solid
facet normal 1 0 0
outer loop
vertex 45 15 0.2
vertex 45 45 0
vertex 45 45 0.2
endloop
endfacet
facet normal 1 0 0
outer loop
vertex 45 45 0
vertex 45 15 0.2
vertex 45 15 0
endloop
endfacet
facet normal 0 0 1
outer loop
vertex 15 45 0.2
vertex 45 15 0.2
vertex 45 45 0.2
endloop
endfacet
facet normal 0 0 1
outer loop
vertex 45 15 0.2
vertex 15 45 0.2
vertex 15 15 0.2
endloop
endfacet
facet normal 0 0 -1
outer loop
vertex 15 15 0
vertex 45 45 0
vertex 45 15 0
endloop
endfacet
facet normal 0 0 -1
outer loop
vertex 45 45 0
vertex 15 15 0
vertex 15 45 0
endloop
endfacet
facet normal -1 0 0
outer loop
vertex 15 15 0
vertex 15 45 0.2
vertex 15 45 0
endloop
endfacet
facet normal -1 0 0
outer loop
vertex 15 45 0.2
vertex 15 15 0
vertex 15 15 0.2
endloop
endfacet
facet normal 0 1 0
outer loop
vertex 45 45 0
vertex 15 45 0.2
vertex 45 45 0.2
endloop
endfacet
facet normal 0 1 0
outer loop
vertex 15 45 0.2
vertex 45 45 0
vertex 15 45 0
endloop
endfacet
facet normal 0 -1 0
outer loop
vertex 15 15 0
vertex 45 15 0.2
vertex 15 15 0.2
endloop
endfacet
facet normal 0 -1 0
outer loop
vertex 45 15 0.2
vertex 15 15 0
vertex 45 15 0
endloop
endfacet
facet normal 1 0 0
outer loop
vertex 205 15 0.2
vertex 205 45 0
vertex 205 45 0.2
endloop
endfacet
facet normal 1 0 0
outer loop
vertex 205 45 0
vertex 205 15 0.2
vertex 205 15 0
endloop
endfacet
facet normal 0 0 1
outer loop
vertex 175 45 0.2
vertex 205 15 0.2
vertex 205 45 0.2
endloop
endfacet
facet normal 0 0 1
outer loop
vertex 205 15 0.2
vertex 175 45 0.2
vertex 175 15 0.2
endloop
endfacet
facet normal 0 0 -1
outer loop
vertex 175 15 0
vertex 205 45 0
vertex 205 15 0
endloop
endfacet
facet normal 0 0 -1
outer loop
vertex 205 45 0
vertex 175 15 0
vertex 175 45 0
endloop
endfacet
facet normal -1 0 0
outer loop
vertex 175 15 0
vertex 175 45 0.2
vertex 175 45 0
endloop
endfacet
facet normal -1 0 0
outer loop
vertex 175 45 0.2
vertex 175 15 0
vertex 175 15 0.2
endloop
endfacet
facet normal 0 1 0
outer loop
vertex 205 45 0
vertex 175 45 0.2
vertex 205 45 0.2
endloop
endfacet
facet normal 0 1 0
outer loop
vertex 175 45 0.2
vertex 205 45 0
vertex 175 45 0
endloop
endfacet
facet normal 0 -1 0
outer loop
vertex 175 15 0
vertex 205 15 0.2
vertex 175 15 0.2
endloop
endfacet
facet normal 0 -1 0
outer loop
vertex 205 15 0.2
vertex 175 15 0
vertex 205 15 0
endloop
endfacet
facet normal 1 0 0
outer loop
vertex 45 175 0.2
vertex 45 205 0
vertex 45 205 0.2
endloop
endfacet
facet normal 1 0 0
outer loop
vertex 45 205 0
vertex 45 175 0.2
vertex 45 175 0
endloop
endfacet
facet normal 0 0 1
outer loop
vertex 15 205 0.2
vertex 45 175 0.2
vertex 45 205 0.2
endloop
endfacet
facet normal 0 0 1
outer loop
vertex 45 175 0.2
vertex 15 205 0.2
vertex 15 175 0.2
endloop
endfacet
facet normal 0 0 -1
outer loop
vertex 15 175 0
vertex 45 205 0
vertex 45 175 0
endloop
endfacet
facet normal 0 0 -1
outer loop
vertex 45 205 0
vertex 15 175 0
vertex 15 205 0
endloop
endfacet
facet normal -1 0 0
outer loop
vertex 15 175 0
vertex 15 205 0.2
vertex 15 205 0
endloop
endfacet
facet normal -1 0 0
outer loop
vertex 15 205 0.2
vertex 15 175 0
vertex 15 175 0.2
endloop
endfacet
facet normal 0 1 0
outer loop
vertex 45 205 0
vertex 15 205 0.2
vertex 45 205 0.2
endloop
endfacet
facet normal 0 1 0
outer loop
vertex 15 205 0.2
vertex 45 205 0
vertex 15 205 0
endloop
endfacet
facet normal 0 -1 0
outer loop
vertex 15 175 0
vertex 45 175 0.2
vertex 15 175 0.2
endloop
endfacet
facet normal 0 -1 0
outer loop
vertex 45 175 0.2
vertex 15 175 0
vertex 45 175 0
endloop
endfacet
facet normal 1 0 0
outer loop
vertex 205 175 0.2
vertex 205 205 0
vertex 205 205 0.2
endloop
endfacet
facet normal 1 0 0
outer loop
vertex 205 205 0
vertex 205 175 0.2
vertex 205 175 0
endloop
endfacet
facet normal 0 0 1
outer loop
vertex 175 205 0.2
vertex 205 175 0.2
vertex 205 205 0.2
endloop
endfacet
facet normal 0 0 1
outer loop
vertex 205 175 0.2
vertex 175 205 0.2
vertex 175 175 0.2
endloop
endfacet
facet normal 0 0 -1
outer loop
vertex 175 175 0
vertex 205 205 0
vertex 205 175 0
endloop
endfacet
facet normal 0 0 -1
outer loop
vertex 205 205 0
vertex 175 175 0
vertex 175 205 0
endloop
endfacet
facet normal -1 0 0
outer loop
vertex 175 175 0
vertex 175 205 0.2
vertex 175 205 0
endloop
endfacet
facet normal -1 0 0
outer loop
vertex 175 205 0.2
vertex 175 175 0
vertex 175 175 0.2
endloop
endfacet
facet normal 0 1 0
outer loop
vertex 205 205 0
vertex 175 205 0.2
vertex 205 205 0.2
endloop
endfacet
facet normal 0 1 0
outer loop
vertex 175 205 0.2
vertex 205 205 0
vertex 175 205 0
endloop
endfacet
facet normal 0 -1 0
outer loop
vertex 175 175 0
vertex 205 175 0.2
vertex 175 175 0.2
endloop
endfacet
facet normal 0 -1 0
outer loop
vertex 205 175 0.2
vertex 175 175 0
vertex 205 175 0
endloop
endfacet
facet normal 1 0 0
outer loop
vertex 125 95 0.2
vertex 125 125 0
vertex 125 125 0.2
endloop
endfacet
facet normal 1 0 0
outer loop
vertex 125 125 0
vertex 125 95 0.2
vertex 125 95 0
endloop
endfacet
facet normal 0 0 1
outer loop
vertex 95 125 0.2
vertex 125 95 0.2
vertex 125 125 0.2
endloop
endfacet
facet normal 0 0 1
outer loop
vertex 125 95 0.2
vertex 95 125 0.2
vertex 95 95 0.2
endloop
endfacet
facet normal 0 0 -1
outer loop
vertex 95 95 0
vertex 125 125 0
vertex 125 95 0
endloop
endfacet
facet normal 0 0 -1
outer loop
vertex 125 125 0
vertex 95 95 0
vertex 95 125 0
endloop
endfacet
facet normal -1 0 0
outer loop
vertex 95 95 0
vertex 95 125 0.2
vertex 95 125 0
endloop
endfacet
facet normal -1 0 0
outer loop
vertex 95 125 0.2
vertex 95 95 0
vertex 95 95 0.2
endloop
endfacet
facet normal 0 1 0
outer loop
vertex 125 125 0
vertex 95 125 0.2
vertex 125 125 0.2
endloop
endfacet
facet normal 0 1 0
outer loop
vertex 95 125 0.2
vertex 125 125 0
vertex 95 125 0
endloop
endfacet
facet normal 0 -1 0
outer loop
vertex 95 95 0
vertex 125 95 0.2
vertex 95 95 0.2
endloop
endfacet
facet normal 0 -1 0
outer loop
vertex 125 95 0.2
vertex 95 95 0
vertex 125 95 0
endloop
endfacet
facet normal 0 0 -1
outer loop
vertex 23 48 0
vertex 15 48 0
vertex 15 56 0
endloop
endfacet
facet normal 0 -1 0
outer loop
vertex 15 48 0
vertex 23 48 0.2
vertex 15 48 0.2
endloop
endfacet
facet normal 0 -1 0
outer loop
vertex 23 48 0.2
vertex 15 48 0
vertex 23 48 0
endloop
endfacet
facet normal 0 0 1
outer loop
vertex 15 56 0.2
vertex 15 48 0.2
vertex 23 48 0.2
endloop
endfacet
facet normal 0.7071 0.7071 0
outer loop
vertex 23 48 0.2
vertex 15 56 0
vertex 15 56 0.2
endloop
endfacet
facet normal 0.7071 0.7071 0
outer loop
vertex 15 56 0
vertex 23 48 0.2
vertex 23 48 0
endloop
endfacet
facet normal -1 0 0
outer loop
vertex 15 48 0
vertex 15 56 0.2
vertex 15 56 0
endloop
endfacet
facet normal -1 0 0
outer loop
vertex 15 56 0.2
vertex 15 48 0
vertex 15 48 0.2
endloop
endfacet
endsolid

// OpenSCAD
// Pièces de diagnostic pour un bruit de grattement sur les premières couches.
// Unités : mm. Choisir la pièce avec `part`, exporter en STL, trancher avec
// les réglages HABITUELS (même profil que les impressions qui grattent).
//
//  "premiere_couche" : 5 carrés d'UNE couche (4 coins + centre) -> Z offset
//                      et planéité du plateau, zone par zone.
//  "escalier"        : 6 marches de 1, 2, 3, 5, 8 et 12 couches -> à quelle
//                      hauteur le grattement commence / s'arrête.
//  "bosses"          : petites îles + longs déplacements entre elles -> le
//                      grattement vient-il de la buse qui frotte des bords
//                      relevés (curling / sur-extrusion) pendant les trajets ?

part = "premiere_couche"; // [premiere_couche, escalier, bosses]

/* [Machine] */
// Zone utile du plateau à couvrir (laisser une marge de ~15 mm au bord).
bed_x = 220;
bed_y = 220;
layer_h = 0.2;
first_layer_h = 0.2;

/* [Première couche] */
square_size = 30;
margin = 15;

/* [Escalier] */
step_layers = [1, 2, 3, 5, 8, 12];
step_w = 25;
step_d = 40;

/* [Bosses] */
islands_per_side = 4;
island_d = 8;
island_layers = 15;

function layers_to_h(n) = first_layer_h + (n - 1) * layer_h;

module premiere_couche() {
    h = first_layer_h;
    pos = [[margin, margin], [bed_x - margin - square_size, margin],
           [margin, bed_y - margin - square_size],
           [bed_x - margin - square_size, bed_y - margin - square_size],
           [(bed_x - square_size) / 2, (bed_y - square_size) / 2]];
    for (i = [0 : len(pos) - 1])
        translate([pos[i][0], pos[i][1], 0])
            cube([square_size, square_size, h]);
    // repère du coin avant gauche : petit triangle
    translate([margin, margin + square_size + 3, 0])
        linear_extrude(h) polygon([[0, 0], [8, 0], [0, 8]]);
}

module escalier() {
    for (i = [0 : len(step_layers) - 1])
        translate([i * step_w, 0, 0])
            cube([step_w, step_d, layers_to_h(step_layers[i])]);
}

module bosses() {
    pitch = (min(bed_x, bed_y) - 2 * margin) / (islands_per_side - 1);
    for (i = [0 : islands_per_side - 1], j = [0 : islands_per_side - 1])
        translate([margin + i * pitch, margin + j * pitch, 0])
            cylinder(d = island_d, h = layers_to_h(island_layers), $fn = 40);
}

if (part == "premiere_couche") premiere_couche();
else if (part == "escalier") escalier();
else bosses();
